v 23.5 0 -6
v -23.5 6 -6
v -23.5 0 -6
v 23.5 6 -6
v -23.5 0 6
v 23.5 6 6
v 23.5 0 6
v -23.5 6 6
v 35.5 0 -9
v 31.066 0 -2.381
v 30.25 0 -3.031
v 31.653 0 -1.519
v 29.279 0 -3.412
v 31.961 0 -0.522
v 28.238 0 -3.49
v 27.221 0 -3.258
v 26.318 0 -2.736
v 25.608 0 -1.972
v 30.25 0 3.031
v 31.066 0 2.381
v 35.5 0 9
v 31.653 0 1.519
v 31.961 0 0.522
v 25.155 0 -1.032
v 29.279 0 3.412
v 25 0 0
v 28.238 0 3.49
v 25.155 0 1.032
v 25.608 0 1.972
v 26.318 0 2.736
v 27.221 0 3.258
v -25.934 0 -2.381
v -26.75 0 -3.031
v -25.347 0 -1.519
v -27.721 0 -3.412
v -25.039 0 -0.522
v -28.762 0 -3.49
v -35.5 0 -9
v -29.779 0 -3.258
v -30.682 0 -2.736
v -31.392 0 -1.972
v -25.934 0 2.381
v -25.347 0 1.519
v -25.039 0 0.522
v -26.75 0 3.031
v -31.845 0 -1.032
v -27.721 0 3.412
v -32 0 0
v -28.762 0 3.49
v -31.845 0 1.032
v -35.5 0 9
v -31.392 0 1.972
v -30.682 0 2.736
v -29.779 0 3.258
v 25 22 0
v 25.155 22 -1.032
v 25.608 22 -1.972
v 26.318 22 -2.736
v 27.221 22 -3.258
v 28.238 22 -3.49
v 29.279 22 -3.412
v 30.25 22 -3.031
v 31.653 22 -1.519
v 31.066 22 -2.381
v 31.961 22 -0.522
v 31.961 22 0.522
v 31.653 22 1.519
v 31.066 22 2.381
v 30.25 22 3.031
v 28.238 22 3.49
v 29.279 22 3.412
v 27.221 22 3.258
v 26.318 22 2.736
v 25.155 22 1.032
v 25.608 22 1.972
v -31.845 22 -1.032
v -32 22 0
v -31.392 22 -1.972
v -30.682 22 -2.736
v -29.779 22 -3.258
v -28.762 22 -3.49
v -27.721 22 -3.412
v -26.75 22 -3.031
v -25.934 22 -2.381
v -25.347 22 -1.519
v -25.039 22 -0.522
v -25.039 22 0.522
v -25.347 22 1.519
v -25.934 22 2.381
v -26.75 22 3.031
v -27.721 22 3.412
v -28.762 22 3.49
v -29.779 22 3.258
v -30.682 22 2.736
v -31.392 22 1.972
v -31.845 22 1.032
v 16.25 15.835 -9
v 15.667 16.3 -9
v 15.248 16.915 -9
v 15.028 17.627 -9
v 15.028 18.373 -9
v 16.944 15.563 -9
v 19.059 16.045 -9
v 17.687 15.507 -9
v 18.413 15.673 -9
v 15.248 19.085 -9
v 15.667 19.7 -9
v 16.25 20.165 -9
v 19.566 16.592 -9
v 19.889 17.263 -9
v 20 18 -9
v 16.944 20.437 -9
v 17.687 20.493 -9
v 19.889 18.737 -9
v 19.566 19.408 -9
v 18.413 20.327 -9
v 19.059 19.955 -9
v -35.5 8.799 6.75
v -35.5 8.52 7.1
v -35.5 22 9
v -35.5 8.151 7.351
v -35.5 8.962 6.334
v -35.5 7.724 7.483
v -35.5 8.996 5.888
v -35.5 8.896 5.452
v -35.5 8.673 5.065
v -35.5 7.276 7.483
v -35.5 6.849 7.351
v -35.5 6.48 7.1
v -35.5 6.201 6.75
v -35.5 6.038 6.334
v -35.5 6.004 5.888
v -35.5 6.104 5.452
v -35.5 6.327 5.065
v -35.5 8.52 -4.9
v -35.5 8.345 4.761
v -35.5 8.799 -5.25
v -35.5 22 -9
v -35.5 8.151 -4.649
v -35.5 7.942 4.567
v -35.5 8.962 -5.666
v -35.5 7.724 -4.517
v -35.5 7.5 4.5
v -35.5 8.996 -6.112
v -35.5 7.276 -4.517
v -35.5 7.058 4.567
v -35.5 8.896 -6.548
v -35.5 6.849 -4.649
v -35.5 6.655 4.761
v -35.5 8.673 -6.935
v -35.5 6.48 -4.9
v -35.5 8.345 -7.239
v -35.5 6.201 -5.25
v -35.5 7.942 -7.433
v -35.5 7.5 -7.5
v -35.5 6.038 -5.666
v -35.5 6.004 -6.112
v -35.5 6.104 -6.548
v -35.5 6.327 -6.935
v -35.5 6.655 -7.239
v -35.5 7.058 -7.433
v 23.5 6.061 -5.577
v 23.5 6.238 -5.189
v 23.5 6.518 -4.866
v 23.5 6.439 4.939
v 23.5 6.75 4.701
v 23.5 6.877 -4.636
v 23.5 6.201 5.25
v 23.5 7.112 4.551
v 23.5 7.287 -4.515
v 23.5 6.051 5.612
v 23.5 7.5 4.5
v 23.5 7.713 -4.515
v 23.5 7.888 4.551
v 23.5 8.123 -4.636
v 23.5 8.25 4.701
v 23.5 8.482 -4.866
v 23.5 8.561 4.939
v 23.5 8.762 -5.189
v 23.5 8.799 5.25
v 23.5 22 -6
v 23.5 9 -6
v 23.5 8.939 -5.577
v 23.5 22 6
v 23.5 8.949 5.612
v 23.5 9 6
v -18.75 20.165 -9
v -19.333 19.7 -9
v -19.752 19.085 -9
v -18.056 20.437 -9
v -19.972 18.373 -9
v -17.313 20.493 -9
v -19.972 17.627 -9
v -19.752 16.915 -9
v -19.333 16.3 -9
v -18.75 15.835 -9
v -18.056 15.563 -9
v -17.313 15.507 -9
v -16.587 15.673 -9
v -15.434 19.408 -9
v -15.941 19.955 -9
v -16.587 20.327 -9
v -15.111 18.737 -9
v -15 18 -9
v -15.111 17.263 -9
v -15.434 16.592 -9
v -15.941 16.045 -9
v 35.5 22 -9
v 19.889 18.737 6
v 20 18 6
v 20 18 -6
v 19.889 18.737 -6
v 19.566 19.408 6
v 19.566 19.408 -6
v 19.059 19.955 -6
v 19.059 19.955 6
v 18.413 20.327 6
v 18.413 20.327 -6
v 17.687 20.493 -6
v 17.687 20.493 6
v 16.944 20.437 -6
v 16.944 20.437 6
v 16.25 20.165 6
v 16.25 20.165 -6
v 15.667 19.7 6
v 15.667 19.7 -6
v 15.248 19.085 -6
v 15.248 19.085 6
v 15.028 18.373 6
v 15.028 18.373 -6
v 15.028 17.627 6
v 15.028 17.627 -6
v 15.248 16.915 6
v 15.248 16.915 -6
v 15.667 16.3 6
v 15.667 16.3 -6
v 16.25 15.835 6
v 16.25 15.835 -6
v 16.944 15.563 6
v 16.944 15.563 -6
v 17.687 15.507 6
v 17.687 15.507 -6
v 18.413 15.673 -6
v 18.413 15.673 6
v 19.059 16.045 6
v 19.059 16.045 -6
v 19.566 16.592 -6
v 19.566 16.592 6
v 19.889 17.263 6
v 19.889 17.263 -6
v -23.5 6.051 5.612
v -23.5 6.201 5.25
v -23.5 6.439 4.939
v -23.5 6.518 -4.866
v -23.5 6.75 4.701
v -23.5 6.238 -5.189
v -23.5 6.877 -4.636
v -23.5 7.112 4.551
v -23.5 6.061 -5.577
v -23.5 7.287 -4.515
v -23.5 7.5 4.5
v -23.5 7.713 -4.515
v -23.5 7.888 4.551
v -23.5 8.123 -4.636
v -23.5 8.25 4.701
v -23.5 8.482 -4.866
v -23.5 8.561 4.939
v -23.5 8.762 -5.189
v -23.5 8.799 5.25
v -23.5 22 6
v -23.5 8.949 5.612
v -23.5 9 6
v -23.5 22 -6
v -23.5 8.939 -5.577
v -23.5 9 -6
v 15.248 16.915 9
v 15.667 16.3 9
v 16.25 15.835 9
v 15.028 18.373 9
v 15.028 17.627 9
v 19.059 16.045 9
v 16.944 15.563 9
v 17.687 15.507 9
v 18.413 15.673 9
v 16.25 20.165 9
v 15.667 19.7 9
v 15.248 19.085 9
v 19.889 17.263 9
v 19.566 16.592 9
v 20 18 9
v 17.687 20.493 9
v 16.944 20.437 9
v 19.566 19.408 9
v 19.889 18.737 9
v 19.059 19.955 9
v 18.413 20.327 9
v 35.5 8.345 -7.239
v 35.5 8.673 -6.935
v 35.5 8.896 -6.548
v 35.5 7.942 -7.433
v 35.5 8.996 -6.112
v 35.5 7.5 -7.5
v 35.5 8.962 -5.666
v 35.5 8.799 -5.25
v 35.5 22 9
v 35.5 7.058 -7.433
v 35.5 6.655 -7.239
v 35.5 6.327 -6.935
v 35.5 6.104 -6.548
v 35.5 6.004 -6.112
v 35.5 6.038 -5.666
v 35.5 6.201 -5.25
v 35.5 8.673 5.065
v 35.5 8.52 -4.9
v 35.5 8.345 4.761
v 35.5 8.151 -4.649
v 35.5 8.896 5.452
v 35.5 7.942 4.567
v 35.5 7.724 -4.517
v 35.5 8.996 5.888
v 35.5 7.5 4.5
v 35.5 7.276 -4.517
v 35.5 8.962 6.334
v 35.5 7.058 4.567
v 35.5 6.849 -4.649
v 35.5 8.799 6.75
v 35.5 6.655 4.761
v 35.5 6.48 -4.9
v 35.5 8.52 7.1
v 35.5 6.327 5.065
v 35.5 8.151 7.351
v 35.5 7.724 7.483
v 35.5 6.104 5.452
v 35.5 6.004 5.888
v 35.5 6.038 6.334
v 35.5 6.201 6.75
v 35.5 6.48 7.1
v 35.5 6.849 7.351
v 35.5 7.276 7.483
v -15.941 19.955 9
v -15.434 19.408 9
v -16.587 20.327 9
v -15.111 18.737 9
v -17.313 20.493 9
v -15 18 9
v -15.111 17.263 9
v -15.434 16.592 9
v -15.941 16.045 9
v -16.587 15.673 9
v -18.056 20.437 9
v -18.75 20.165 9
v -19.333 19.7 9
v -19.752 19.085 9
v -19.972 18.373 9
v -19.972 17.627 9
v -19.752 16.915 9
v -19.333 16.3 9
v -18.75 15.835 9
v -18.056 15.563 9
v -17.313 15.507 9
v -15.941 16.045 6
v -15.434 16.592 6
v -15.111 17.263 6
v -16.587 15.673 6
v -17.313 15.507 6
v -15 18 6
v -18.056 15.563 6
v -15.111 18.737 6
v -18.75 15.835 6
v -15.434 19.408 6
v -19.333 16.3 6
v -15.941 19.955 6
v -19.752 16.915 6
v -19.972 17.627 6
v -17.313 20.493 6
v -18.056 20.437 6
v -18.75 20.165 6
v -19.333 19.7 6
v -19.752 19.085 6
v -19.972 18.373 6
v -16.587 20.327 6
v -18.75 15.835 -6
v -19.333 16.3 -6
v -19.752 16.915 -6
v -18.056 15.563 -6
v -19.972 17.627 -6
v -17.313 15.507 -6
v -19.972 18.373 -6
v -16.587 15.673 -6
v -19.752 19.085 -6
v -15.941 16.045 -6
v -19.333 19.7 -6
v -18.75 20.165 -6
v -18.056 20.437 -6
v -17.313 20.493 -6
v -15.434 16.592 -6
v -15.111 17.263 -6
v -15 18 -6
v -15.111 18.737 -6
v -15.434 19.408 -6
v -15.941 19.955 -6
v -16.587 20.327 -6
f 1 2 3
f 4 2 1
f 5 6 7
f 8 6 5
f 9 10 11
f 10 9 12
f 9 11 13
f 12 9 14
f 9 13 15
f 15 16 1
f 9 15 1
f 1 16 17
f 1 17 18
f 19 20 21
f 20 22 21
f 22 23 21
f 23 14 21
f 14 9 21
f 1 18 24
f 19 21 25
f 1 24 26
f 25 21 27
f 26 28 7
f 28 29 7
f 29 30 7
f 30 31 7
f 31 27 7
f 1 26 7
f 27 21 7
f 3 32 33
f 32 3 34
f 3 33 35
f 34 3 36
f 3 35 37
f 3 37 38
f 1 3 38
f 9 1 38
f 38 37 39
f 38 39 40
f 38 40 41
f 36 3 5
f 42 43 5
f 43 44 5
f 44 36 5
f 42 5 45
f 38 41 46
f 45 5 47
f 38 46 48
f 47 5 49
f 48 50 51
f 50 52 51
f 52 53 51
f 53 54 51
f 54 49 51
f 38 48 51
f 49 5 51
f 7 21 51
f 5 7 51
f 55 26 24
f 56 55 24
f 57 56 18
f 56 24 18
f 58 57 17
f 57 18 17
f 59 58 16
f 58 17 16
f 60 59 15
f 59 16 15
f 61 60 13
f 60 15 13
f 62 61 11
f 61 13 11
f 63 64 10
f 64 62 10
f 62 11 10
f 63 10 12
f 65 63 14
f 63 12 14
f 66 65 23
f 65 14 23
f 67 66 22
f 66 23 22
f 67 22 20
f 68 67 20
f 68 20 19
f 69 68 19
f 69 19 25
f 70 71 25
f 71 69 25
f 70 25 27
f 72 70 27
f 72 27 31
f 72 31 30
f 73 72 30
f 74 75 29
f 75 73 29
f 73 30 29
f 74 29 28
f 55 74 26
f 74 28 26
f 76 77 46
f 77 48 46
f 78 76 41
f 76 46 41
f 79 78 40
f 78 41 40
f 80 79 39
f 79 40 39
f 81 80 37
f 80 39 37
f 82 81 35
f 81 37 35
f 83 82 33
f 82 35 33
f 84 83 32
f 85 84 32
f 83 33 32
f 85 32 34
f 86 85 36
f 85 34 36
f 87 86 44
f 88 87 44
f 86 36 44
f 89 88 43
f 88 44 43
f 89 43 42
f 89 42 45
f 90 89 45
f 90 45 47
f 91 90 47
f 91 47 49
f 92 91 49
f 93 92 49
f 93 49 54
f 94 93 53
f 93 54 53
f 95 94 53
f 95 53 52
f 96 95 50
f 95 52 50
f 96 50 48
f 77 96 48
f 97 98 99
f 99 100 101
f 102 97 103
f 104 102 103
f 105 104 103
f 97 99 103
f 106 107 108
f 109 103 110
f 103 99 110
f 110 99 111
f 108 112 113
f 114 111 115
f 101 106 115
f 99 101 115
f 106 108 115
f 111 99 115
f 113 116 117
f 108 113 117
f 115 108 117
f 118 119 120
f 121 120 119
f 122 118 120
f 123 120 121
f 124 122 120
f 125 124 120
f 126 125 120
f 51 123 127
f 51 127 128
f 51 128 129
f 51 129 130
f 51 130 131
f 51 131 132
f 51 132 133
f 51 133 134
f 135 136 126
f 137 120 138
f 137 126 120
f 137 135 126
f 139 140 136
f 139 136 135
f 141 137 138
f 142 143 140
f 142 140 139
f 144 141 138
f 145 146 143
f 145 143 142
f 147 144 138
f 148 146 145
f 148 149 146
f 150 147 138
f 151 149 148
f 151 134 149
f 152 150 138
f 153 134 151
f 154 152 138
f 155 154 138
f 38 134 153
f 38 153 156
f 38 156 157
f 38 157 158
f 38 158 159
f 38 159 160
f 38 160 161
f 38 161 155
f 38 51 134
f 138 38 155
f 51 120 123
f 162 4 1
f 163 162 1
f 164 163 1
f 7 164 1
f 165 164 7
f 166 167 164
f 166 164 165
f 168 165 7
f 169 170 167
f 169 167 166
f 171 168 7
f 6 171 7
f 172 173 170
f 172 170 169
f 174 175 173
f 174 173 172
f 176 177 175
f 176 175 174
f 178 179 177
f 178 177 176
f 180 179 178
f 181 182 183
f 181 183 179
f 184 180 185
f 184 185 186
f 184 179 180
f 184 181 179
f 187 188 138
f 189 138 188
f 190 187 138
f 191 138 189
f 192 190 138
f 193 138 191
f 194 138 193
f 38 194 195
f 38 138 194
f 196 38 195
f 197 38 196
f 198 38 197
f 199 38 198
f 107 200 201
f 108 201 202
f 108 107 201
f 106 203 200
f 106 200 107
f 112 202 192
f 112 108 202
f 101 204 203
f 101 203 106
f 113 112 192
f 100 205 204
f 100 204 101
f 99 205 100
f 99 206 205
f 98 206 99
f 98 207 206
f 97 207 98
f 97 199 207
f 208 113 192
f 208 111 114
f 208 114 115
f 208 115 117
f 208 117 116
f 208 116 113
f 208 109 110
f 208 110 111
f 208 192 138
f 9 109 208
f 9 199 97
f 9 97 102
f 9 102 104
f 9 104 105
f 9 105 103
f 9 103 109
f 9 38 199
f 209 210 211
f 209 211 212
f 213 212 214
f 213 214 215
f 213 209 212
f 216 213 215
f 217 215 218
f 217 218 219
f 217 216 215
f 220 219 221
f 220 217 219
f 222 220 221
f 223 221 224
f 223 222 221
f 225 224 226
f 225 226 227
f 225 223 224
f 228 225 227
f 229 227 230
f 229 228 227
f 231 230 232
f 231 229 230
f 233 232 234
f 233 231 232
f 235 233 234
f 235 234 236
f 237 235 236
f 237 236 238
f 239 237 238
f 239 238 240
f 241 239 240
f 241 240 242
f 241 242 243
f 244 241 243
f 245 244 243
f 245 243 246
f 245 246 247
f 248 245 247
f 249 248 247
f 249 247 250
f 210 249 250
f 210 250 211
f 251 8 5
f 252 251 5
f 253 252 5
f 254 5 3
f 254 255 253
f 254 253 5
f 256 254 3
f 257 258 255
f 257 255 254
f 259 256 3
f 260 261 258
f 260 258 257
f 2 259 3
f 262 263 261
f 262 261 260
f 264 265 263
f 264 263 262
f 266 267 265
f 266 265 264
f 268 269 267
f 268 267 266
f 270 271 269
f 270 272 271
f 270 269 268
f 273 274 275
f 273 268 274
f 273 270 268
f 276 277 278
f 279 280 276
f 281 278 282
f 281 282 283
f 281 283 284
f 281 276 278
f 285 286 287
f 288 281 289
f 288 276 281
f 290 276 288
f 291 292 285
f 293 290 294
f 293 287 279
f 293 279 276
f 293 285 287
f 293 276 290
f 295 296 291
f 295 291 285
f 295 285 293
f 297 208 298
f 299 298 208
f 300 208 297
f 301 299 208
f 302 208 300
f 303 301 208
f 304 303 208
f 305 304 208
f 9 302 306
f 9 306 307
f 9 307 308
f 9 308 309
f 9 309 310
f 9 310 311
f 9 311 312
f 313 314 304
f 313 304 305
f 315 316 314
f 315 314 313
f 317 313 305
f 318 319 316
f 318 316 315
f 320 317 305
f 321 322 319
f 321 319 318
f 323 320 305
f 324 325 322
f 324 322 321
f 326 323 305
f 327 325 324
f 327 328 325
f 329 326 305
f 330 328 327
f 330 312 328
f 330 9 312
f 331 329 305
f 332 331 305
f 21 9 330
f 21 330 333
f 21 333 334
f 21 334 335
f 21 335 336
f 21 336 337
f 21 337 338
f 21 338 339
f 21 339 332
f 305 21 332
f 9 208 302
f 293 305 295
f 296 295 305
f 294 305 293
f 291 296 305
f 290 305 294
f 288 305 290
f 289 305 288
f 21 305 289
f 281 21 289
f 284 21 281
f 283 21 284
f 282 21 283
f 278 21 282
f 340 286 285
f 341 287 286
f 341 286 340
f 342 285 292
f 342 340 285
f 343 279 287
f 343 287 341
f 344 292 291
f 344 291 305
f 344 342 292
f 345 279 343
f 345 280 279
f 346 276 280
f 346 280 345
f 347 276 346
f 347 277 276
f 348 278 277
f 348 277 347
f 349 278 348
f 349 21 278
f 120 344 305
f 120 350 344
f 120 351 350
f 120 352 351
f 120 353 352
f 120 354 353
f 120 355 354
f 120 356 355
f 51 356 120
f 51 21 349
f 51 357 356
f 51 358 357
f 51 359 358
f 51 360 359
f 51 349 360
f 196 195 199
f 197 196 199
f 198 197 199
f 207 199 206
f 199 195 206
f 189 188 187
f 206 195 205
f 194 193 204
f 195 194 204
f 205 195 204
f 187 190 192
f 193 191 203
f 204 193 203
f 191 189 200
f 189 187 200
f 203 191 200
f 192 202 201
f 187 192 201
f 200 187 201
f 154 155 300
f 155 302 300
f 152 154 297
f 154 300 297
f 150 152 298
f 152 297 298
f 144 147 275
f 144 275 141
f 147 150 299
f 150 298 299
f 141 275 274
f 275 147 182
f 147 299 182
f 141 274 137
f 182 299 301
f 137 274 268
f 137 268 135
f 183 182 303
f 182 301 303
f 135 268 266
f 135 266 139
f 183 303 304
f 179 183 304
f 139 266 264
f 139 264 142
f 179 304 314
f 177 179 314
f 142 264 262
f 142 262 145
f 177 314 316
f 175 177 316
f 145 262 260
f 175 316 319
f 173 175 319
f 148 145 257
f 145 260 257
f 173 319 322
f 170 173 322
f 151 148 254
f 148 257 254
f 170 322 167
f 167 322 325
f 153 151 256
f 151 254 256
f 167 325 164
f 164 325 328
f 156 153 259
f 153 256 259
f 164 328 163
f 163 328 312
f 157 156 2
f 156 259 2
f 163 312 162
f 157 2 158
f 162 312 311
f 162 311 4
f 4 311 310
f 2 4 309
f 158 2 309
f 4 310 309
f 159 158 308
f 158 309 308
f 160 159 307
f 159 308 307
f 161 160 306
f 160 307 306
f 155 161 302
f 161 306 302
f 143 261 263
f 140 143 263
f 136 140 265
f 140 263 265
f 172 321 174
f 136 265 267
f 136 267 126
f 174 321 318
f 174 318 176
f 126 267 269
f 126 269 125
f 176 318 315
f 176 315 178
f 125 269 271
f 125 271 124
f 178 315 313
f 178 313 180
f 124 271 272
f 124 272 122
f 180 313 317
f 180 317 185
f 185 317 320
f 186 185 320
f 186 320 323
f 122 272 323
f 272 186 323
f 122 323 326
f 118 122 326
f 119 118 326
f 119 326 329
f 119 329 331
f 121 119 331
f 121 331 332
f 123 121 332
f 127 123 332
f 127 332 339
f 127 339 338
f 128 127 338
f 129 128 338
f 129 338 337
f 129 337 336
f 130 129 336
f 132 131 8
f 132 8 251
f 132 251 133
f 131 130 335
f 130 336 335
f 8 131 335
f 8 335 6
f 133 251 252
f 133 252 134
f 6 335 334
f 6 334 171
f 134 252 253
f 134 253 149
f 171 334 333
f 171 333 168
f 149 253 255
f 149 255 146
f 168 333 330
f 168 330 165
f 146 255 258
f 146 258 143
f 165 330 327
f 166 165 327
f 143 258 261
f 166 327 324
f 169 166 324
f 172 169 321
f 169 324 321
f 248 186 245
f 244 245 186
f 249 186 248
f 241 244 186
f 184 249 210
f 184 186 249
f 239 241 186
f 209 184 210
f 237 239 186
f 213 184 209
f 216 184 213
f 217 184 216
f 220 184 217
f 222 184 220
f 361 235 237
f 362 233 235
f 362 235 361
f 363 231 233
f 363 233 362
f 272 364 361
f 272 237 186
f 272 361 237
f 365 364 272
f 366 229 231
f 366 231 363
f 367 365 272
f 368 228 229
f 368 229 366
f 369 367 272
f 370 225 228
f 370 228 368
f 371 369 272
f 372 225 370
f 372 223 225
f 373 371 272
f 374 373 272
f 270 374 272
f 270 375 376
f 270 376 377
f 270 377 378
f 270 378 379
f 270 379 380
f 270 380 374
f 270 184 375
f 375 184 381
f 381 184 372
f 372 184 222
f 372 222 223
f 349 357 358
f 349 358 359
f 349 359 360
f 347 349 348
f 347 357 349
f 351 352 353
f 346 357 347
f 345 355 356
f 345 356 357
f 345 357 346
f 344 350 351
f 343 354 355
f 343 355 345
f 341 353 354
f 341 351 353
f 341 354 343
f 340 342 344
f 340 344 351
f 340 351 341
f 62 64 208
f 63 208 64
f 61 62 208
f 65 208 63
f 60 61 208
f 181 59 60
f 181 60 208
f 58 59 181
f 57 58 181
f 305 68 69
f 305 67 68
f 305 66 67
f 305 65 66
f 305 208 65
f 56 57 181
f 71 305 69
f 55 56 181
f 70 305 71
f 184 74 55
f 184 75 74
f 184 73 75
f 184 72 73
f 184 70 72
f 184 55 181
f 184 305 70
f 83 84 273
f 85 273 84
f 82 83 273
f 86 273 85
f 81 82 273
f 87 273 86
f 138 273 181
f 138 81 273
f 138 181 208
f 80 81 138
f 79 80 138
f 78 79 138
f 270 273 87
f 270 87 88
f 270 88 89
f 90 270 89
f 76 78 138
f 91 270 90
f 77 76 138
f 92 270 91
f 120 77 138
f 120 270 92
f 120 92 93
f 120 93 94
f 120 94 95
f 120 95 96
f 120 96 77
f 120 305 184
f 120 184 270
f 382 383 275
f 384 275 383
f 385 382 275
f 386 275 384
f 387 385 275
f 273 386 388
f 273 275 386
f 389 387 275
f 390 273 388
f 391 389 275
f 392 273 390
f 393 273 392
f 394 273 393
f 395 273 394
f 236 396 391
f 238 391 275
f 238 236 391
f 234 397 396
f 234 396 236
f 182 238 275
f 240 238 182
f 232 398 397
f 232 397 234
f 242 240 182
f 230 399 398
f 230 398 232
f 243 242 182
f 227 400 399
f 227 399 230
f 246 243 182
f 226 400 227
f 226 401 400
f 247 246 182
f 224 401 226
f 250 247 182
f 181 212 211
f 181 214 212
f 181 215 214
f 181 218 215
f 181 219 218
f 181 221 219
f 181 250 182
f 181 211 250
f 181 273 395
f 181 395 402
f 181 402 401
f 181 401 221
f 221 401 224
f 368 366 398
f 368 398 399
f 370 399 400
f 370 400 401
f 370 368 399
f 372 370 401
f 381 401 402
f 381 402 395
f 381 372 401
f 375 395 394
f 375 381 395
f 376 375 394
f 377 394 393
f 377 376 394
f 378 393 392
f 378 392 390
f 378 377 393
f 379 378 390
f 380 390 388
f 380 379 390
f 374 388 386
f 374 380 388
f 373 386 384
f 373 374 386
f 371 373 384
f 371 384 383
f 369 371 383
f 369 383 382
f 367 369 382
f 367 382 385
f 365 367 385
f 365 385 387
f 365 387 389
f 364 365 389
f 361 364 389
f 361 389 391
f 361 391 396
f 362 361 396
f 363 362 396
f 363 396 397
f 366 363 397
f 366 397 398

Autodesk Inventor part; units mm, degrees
ref_plane "YZ Plane" through (0, 0, 0) normal (1, 0, 0) x (0, 1, 0)
ref_plane "XZ Plane" through (0, 0, 0) normal (0, 1, 0) x (-1, 0, 0)
ref_plane "XY Plane" through (0, 0, 0) normal (0, 0, 1) x (1, 0, 0)
sketch "Esquisse1" plane through (0, 0, 0) normal (0, 1, 0) x (-1, 0, 0)
  circle A0 centre (-28.5, 0) radius 3.5
  circle A1 centre (28.5, 0) radius 3.5
  line L0 (-35.5, 9) -> (35.5, 9)
  line L1 (35.5, 9) -> (35.5, -9)
  line L2 (35.5, -9) -> (-35.5, -9)
  line L3 (-35.5, -9) -> (-35.5, 9)
  line L4 (-28.5, 0) -> (28.5, 0)
  point P0 (0, 0)
  dimension "d0" = 7
  dimension "d1" = 7
  dimension "d2" = 28.5
  dimension "d3" = 28.5
  dimension "d4" = 18
  dimension "d5" = 9
  dimension "d6" = 7
  dimension "d7" = 7
extrude "Extrusion1" add sketch "Esquisse1" along normal blind 22
sketch "Esquisse2" plane through (0, 22, 0) normal (0, 1, 0) x (1, 0, 0)
  circle A0 centre (-28.5, 0) radius 3.5 projected
  circle A1 centre (28.5, 0) radius 3.5 projected
  line L0 (-23.5, 6) -> (23.5, 6)
  line L1 (23.5, 6) -> (23.5, -6)
  line L2 (23.5, -6) -> (-23.5, -6)
  line L3 (-23.5, -6) -> (-23.5, 6)
  point P0 (0, 0)
  dimension "d10" = 12
  dimension "d11" = 6
  dimension "d12" = 5
  dimension "d13" = 5
extrude "Extrusion2" cut sketch "Esquisse2" against normal through all contours L0 L1 L2 L3
sketch "Esquisse3" plane through (-35.5, 0, 9) normal (0, 0, 1) x (1, 0, 0)
  line L0 (71, 0) -> (0, 0) projected
  line L1 (71, 0) -> (71, 22) projected
  line L2 (0, 22) -> (71, 22) projected
  line L3 (0, 0) -> (0, 22) projected
  line L4 (14, 22) -> (57, 22)
  line L5 (57, 22) -> (57, 0)
  line L6 (57, 0) -> (14, 0)
  line L7 (14, 0) -> (14, 22)
  line L8 (14, 22) -> (22, 22)
  line L9 (22, 22) -> (22, 14)
  line L10 (22, 14) -> (14, 14)
  line L11 (14, 14) -> (14, 22)
  line L12 (57, 22) -> (49, 22)
  line L13 (49, 22) -> (49, 14)
  line L14 (49, 14) -> (57, 14)
  line L15 (57, 14) -> (57, 22)
  line L16 (14, 22) -> (22, 14)
  line L17 (22, 22) -> (14, 14)
  line L18 (49, 14) -> (57, 22)
  line L19 (49, 22) -> (57, 14)
  circle A0 centre (18, 18) radius 2.5
  circle A1 centre (53, 18) radius 2.5
  point P0 (35.5, 0)
  dimension "d16" = 14
  dimension "d17" = 14
  dimension "d18" = 8
  dimension "d19" = 8
  dimension "d20" = 8
  dimension "d21" = 8
  dimension "d22" = 5
  dimension "d23" = 5
sketch "Esquisse3 outline for Extrusion3" plane through (-35.5, 0, 9) normal (0, 0, 1) x (1, 0, 0)
  circle A0 centre (18, 18) radius 2.5
  circle A1 centre (53, 18) radius 2.5
extrude "Extrusion3" add sketch "Esquisse3 outline for Extrusion3" along normal through all both and the other way through all
sketch "Esquisse4" plane through (35.5, 0, 9) normal (1, 0, 0) x (0, 0, -1)
  line L0 (18, 0) -> (0, 0) projected
  line L1 (0, 22) -> (18, 22) projected
  line L2 (6, 22) -> (12, 22)
  line L3 (12, 22) -> (12, 0)
  line L4 (12, 0) -> (6, 0)
  line L5 (6, 0) -> (6, 22)
  circle A0 centre (3, 7.5) radius 1.5
  circle A1 centre (15, 7.5) radius 1.5
  line L6 (18, 0) -> (18, 22) projected
  line L7 (0, 0) -> (6, 0)
  line L8 (6, 0) -> (6, 15)
  line L9 (6, 15) -> (0, 15)
  line L10 (0, 15) -> (0, 0)
  line L11 (12, 0) -> (18, 0)
  line L12 (18, 0) -> (18, 15)
  line L13 (18, 15) -> (12, 15)
  line L14 (12, 15) -> (12, 0)
  line L15 (0, 15) -> (6, 0)
  line L16 (6, 15) -> (0, 0)
  line L17 (12, 15) -> (18, 0)
  line L18 (18, 15) -> (12, 0)
  point P0 (9, 0)
  point P1 (3, 7.5)
  point P2 (15, 7.5)
  dimension "d26" = 6
  dimension "d27" = 3
  dimension "d28" = 3
  dimension "d29" = 3
  dimension "d32" = 15
extrude "Extrusion4" cut sketch "Esquisse4" against normal through all contours L17 L18 A1 | A1 L18 L17 | A1 L17 L18 | L18 L17 A1 | L15 L16 A0 | A0 L16 L15 | A0 L15 L16 | L16 L15 A0
equation "\"d3\" = d2"
equation "\"d5\" = 0.5 * d4"
equation "\"d11\" = 0.5 * d10"
equation "\"d17\" = d16"
equation "\"d27\" = 0.5 * d26"
properties part number "tendeur_base"
